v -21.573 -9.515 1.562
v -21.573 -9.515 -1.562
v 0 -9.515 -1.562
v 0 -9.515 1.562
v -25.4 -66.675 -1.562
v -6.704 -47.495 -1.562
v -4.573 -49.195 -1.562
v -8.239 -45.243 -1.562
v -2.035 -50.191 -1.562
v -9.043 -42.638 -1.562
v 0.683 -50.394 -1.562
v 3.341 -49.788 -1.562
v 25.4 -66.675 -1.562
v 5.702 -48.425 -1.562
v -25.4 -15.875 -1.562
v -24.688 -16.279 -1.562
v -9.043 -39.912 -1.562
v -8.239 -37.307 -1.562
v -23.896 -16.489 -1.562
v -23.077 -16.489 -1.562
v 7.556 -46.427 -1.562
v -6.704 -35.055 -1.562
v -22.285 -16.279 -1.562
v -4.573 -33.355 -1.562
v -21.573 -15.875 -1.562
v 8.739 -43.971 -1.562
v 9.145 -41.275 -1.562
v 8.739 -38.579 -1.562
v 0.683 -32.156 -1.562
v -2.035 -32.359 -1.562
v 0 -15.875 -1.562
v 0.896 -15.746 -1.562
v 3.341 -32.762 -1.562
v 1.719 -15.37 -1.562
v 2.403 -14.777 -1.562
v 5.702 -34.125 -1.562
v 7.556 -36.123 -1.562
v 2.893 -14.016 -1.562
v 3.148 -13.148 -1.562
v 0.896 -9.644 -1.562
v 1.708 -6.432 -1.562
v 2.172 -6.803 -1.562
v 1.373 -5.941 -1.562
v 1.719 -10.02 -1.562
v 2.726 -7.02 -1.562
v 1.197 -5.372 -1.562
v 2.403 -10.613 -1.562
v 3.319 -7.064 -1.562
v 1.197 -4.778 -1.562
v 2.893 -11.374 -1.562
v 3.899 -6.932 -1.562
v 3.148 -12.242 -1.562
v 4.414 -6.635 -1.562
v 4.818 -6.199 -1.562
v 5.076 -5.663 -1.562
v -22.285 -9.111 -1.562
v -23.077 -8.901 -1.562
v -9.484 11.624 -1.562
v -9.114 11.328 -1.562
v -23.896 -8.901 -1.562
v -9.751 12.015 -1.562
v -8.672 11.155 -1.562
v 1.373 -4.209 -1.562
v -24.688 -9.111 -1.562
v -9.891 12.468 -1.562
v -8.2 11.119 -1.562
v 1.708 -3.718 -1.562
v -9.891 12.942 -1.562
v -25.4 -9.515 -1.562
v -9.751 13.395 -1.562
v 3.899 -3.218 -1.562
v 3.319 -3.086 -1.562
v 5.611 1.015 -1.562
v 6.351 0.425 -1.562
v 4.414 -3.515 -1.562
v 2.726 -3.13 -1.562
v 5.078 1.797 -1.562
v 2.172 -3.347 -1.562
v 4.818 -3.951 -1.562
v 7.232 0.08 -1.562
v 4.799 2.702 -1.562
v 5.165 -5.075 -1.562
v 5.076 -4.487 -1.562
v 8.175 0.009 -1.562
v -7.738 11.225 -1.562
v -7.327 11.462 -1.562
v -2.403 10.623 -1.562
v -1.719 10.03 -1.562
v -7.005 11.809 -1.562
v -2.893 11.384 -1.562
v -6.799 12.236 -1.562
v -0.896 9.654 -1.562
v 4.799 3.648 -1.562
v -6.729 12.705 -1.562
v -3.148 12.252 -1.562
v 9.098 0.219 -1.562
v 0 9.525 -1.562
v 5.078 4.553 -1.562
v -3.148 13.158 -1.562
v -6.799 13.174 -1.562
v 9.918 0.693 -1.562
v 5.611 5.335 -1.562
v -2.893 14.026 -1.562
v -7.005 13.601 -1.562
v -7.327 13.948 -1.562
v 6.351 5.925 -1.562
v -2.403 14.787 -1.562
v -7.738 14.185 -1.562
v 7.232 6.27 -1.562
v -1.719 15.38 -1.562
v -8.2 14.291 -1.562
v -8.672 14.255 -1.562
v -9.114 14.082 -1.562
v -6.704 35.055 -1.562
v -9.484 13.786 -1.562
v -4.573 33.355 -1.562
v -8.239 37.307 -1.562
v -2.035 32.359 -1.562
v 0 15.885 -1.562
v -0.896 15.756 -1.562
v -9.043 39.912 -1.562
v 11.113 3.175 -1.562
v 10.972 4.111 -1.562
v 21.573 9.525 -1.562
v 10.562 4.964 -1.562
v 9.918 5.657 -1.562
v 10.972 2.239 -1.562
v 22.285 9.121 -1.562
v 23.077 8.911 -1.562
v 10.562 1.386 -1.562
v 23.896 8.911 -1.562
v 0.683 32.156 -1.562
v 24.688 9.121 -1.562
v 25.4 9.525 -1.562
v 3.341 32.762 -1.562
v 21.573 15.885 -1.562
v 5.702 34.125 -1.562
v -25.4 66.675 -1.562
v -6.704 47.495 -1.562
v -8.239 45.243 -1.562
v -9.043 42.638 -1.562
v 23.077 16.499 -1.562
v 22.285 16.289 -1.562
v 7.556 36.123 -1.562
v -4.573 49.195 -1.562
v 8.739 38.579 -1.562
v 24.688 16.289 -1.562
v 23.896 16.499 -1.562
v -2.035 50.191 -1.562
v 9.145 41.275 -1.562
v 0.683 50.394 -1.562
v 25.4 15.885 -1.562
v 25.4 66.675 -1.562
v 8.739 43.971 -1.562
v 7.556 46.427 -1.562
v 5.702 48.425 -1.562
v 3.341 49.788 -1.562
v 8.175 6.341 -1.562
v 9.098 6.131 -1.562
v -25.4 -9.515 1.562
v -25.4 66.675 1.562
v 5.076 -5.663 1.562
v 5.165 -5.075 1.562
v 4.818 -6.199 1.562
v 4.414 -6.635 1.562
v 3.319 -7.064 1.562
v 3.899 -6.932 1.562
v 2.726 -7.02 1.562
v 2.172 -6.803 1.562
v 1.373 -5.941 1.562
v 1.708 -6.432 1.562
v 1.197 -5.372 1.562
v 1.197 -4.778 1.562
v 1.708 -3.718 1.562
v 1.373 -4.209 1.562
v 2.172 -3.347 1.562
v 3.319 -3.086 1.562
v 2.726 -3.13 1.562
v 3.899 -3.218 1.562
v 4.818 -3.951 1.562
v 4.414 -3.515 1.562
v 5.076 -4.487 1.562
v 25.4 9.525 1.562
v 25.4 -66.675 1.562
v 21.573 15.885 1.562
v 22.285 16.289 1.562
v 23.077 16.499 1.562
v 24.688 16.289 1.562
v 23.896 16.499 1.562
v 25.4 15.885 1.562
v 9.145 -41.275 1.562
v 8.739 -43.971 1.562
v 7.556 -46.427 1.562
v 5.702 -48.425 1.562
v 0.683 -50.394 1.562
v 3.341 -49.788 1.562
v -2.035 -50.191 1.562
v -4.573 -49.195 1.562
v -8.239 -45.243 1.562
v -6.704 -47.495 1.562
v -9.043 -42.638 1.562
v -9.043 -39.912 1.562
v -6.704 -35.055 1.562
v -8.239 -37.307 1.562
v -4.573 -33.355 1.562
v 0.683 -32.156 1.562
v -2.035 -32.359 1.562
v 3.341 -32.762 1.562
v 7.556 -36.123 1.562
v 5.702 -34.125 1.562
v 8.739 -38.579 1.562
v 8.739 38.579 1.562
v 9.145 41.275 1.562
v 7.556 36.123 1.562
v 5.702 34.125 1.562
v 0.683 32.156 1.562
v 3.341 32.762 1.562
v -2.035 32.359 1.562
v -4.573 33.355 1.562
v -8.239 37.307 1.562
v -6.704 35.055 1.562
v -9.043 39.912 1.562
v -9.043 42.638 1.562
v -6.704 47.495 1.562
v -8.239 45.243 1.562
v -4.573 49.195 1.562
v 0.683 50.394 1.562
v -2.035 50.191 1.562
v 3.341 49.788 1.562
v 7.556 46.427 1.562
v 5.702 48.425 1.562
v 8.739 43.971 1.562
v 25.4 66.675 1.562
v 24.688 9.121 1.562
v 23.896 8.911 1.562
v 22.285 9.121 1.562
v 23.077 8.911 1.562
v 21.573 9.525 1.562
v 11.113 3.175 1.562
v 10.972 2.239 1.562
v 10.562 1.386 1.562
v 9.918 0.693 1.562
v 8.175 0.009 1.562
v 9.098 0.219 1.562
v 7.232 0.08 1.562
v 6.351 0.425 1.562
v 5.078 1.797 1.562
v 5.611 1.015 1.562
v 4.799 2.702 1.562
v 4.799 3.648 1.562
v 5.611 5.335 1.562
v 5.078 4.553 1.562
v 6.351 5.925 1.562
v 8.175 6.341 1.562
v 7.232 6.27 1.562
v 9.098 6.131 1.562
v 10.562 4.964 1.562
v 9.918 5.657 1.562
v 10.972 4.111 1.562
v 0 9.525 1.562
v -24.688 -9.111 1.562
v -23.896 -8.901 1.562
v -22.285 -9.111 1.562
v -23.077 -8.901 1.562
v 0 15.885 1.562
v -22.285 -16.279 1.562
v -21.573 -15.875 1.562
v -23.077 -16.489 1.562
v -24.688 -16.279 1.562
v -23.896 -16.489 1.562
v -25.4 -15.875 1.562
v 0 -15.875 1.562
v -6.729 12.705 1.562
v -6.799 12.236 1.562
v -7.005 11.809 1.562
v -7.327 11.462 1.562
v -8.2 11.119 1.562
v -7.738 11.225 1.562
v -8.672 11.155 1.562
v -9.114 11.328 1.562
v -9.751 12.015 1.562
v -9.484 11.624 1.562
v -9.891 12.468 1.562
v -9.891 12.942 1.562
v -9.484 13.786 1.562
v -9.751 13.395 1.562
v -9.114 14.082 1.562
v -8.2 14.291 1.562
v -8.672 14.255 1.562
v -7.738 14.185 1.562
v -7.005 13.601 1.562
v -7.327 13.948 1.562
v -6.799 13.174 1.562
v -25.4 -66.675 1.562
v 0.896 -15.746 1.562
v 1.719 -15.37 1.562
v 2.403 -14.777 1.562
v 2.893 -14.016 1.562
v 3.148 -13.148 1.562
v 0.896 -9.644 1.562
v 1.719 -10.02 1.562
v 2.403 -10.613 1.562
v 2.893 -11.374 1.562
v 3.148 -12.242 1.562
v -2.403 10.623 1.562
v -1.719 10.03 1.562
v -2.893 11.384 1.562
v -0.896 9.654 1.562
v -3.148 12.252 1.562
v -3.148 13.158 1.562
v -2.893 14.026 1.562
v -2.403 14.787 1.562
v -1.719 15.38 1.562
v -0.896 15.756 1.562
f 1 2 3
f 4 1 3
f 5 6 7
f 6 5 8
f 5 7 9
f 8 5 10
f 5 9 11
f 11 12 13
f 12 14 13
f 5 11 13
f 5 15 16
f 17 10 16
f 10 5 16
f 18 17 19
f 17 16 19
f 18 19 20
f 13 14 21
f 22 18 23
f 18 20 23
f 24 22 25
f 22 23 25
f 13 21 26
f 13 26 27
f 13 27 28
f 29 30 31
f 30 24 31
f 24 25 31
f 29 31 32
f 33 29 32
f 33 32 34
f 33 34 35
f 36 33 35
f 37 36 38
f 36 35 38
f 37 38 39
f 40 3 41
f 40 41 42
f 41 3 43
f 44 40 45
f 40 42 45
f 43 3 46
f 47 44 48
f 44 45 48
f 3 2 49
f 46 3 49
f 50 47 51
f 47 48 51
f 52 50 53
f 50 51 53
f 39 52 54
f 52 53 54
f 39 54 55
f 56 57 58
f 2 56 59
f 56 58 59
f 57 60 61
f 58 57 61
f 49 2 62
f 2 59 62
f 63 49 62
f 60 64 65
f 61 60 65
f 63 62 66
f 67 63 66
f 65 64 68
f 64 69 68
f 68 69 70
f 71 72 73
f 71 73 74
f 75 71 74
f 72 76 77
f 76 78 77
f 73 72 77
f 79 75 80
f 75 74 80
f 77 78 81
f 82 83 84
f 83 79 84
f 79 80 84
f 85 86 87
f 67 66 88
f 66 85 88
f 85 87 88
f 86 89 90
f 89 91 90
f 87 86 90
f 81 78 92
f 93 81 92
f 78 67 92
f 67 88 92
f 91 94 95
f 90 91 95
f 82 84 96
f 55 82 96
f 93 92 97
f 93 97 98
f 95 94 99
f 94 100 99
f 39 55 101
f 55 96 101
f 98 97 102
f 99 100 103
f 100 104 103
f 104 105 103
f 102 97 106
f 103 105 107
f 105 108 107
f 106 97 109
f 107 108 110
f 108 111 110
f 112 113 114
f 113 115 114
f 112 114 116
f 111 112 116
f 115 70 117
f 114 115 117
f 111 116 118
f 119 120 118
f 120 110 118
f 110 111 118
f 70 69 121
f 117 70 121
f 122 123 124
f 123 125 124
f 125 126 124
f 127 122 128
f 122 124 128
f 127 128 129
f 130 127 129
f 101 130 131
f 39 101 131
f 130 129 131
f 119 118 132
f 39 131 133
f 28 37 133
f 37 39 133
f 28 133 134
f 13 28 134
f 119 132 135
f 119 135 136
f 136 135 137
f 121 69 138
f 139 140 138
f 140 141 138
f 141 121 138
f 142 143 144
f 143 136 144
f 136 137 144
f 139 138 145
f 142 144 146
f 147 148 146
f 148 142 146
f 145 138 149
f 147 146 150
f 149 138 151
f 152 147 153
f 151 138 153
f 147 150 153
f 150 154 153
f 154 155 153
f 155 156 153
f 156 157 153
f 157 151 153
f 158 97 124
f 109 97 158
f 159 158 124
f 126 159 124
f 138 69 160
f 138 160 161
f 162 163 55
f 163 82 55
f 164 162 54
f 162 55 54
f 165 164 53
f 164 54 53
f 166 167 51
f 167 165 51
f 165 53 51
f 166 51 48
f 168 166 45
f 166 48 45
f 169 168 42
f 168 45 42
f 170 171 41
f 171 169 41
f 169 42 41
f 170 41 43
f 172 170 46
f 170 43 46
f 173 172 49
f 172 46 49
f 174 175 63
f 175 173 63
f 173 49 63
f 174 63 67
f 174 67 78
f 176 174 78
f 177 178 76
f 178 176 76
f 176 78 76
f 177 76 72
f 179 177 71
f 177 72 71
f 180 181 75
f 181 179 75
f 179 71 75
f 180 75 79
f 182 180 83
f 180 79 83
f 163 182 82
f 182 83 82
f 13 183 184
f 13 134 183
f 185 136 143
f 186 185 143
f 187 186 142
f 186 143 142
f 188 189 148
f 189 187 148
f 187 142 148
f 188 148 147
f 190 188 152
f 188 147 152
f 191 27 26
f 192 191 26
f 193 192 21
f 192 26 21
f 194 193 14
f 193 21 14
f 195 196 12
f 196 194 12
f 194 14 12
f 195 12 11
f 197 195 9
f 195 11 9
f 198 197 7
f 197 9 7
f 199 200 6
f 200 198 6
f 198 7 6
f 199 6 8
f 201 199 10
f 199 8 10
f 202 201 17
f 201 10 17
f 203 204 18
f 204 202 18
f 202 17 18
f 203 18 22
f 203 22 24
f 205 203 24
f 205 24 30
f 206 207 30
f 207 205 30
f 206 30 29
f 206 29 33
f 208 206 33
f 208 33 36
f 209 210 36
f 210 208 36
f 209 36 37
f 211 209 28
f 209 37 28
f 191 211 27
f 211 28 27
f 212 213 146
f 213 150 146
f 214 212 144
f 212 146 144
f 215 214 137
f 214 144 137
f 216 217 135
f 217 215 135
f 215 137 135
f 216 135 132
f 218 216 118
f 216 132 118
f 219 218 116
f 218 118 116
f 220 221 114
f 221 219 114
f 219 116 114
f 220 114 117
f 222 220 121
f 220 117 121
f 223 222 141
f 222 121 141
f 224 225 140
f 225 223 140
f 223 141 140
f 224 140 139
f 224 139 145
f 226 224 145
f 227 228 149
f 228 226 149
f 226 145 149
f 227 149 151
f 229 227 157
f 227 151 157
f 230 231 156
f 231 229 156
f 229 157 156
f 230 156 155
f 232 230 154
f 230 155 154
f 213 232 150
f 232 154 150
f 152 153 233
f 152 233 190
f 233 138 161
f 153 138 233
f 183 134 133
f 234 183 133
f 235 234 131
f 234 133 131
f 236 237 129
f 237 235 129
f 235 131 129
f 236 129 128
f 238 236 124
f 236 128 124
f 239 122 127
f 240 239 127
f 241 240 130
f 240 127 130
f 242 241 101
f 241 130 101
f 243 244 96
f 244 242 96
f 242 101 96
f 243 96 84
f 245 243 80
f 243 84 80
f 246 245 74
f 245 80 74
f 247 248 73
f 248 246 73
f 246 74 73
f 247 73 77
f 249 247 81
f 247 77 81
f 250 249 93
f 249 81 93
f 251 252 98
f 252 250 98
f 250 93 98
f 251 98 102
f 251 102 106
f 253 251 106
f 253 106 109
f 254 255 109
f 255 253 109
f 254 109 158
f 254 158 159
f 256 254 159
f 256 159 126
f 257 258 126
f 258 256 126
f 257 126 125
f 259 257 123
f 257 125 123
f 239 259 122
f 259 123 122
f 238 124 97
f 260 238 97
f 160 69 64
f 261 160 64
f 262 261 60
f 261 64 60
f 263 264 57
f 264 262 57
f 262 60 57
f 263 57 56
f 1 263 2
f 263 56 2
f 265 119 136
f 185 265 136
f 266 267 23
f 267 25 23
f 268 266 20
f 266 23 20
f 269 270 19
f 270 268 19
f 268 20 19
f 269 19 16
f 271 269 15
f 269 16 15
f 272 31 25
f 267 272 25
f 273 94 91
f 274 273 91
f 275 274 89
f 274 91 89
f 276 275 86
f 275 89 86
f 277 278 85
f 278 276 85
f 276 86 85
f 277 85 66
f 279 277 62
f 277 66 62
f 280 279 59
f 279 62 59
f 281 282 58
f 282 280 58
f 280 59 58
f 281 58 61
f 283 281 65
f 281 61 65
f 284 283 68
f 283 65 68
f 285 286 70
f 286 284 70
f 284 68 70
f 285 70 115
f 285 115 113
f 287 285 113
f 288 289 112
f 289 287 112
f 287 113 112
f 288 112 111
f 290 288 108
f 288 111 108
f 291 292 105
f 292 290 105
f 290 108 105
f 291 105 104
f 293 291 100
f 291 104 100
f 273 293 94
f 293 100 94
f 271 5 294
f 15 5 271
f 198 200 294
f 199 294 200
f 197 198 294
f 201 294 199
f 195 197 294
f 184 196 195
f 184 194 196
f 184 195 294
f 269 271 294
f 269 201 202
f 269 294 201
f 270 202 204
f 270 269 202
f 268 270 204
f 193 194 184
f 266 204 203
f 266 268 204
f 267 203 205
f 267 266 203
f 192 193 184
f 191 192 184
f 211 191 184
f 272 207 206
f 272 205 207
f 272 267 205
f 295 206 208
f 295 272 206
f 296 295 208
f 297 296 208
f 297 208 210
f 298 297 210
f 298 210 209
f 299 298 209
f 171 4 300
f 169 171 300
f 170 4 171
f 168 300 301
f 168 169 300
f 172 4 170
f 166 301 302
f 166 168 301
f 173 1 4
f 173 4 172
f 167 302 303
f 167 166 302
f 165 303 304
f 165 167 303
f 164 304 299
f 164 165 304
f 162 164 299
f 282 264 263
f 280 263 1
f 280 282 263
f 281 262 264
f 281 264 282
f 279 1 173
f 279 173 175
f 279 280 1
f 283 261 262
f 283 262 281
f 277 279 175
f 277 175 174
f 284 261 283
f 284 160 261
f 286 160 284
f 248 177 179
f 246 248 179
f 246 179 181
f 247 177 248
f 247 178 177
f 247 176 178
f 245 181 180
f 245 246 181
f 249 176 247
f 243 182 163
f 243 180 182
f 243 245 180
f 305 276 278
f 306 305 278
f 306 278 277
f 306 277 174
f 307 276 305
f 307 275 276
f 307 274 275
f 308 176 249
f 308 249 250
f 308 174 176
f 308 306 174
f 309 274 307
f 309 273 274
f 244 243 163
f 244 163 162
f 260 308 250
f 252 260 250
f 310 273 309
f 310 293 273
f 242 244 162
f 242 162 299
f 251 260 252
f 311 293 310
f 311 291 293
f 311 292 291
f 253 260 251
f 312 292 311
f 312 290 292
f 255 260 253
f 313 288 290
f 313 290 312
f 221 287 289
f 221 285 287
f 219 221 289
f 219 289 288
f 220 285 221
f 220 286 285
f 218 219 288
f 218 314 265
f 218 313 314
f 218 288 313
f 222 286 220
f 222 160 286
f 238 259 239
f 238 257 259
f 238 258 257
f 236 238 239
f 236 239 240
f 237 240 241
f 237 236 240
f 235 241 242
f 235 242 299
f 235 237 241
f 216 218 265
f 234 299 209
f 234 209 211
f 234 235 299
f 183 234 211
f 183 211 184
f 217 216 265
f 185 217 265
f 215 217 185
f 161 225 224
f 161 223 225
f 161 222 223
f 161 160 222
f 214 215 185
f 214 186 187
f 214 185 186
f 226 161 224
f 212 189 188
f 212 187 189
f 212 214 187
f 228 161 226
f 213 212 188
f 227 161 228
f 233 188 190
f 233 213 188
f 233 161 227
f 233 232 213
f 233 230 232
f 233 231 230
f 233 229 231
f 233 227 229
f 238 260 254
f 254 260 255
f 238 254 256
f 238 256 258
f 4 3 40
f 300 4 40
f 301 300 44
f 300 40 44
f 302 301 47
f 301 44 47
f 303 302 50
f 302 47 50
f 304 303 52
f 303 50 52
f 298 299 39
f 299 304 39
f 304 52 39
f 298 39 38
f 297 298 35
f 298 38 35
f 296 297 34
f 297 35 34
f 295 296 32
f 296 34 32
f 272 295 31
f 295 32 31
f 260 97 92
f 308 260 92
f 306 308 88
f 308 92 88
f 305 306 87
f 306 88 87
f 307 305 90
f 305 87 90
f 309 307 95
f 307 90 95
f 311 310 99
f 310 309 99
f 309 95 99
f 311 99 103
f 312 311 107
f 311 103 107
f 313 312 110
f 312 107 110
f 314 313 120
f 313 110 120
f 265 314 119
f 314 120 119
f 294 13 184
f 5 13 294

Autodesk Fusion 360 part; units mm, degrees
sketch "Sketch1" plane through (0, 0, 0) normal (0, 0, 1) x (1, 0, 0)
  line L0 (-25.4, 66.675) -> (25.4, 66.675)
  line L1 (25.4, -66.675) -> (-25.4, -66.675)
  circle A0 centre (-8.3186, 12.705) radius 1.59
  circle A1 centre (7.9382, 3.175) radius 3.175
  circle A2 centre (3.17, -5.075) radius 1.995
  arc A3 (-21.5734, -9.515) -> (-25.4, -9.515) centre (-23.4867, -12.055) ccw
  arc A4 (-25.4, -15.875) -> (-21.5734, -15.875) centre (-23.4867, -13.335) ccw
  line L2 (-21.5734, -9.515) -> (0, -9.515)
  arc A5 (0, -15.875) -> (0, -9.515) centre (0, -12.695) ccw
  line L3 (0, -15.875) -> (-21.5734, -15.875)
  line L4 (-25.4, -66.675) -> (-25.4, -15.875)
  line L5 (-25.4, -9.515) -> (-25.4, 66.675)
  arc A6 (25.4, 15.885) -> (21.5734, 15.885) centre (23.4867, 13.345) ccw
  arc A7 (21.5734, 9.525) -> (25.4, 9.525) centre (23.4867, 12.065) ccw
  line L6 (21.5734, 9.525) -> (0, 9.525)
  arc A8 (0, 15.885) -> (0, 9.525) centre (0, 12.705) ccw
  line L7 (0, 15.885) -> (21.5734, 15.885)
  line L8 (25.4, 66.675) -> (25.4, 15.885)
  line L9 (25.4, 9.525) -> (25.4, -66.675)
  line L10 (0, 66.675) -> (0, -66.675) construction
  line L11 (-60, 0) -> (90, 0) construction
  circle A9 centre (0, 41.275) radius 9.145
  circle A10 centre (0, -41.275) radius 9.145
  line L12 (-8.3186, 12.705) -> (0, 12.705) construction
  line L13 (-23.4867, -12.055) -> (-23.4867, -13.335) construction
  line L14 (0, -12.695) -> (-23.4867, -12.695) construction
  line L15 (23.4867, 13.345) -> (23.4867, 12.065) construction
  line L16 (0, 12.705) -> (23.4867, 12.705) construction
  line L17 (-25.4, -9.515) -> (-21.5734, -9.515) construction
  line L18 (21.5734, 15.885) -> (25.4, 15.885) construction
  dimension "d1" = 133.35
  dimension "d2" = 50.8
  dimension "d3" = 3.18
  dimension "d4" = 6.35
  dimension "d5" = 3.99
  dimension "d6" = 3.18
  dimension "d7" = 18.29
  dimension "d8" = 25.4
  dimension "d9" = 25.4
  dimension "d10" = 3.18
  dimension "d11" = 3.18
  dimension "d12" = 53.98
  dimension "d13" = 79.38
  dimension "d14" = 61.6
  dimension "d15" = 69.85
  dimension "d16" = 17.4618
  dimension "d17" = 22.23
  dimension "d18" = 33.7186
  dimension "d19" = 0.64
  dimension "d20" = 0.64
  dimension "d21" = 66.675
extrude "Extrude1" add sketch "Sketch1" along normal mid plane 3.124
